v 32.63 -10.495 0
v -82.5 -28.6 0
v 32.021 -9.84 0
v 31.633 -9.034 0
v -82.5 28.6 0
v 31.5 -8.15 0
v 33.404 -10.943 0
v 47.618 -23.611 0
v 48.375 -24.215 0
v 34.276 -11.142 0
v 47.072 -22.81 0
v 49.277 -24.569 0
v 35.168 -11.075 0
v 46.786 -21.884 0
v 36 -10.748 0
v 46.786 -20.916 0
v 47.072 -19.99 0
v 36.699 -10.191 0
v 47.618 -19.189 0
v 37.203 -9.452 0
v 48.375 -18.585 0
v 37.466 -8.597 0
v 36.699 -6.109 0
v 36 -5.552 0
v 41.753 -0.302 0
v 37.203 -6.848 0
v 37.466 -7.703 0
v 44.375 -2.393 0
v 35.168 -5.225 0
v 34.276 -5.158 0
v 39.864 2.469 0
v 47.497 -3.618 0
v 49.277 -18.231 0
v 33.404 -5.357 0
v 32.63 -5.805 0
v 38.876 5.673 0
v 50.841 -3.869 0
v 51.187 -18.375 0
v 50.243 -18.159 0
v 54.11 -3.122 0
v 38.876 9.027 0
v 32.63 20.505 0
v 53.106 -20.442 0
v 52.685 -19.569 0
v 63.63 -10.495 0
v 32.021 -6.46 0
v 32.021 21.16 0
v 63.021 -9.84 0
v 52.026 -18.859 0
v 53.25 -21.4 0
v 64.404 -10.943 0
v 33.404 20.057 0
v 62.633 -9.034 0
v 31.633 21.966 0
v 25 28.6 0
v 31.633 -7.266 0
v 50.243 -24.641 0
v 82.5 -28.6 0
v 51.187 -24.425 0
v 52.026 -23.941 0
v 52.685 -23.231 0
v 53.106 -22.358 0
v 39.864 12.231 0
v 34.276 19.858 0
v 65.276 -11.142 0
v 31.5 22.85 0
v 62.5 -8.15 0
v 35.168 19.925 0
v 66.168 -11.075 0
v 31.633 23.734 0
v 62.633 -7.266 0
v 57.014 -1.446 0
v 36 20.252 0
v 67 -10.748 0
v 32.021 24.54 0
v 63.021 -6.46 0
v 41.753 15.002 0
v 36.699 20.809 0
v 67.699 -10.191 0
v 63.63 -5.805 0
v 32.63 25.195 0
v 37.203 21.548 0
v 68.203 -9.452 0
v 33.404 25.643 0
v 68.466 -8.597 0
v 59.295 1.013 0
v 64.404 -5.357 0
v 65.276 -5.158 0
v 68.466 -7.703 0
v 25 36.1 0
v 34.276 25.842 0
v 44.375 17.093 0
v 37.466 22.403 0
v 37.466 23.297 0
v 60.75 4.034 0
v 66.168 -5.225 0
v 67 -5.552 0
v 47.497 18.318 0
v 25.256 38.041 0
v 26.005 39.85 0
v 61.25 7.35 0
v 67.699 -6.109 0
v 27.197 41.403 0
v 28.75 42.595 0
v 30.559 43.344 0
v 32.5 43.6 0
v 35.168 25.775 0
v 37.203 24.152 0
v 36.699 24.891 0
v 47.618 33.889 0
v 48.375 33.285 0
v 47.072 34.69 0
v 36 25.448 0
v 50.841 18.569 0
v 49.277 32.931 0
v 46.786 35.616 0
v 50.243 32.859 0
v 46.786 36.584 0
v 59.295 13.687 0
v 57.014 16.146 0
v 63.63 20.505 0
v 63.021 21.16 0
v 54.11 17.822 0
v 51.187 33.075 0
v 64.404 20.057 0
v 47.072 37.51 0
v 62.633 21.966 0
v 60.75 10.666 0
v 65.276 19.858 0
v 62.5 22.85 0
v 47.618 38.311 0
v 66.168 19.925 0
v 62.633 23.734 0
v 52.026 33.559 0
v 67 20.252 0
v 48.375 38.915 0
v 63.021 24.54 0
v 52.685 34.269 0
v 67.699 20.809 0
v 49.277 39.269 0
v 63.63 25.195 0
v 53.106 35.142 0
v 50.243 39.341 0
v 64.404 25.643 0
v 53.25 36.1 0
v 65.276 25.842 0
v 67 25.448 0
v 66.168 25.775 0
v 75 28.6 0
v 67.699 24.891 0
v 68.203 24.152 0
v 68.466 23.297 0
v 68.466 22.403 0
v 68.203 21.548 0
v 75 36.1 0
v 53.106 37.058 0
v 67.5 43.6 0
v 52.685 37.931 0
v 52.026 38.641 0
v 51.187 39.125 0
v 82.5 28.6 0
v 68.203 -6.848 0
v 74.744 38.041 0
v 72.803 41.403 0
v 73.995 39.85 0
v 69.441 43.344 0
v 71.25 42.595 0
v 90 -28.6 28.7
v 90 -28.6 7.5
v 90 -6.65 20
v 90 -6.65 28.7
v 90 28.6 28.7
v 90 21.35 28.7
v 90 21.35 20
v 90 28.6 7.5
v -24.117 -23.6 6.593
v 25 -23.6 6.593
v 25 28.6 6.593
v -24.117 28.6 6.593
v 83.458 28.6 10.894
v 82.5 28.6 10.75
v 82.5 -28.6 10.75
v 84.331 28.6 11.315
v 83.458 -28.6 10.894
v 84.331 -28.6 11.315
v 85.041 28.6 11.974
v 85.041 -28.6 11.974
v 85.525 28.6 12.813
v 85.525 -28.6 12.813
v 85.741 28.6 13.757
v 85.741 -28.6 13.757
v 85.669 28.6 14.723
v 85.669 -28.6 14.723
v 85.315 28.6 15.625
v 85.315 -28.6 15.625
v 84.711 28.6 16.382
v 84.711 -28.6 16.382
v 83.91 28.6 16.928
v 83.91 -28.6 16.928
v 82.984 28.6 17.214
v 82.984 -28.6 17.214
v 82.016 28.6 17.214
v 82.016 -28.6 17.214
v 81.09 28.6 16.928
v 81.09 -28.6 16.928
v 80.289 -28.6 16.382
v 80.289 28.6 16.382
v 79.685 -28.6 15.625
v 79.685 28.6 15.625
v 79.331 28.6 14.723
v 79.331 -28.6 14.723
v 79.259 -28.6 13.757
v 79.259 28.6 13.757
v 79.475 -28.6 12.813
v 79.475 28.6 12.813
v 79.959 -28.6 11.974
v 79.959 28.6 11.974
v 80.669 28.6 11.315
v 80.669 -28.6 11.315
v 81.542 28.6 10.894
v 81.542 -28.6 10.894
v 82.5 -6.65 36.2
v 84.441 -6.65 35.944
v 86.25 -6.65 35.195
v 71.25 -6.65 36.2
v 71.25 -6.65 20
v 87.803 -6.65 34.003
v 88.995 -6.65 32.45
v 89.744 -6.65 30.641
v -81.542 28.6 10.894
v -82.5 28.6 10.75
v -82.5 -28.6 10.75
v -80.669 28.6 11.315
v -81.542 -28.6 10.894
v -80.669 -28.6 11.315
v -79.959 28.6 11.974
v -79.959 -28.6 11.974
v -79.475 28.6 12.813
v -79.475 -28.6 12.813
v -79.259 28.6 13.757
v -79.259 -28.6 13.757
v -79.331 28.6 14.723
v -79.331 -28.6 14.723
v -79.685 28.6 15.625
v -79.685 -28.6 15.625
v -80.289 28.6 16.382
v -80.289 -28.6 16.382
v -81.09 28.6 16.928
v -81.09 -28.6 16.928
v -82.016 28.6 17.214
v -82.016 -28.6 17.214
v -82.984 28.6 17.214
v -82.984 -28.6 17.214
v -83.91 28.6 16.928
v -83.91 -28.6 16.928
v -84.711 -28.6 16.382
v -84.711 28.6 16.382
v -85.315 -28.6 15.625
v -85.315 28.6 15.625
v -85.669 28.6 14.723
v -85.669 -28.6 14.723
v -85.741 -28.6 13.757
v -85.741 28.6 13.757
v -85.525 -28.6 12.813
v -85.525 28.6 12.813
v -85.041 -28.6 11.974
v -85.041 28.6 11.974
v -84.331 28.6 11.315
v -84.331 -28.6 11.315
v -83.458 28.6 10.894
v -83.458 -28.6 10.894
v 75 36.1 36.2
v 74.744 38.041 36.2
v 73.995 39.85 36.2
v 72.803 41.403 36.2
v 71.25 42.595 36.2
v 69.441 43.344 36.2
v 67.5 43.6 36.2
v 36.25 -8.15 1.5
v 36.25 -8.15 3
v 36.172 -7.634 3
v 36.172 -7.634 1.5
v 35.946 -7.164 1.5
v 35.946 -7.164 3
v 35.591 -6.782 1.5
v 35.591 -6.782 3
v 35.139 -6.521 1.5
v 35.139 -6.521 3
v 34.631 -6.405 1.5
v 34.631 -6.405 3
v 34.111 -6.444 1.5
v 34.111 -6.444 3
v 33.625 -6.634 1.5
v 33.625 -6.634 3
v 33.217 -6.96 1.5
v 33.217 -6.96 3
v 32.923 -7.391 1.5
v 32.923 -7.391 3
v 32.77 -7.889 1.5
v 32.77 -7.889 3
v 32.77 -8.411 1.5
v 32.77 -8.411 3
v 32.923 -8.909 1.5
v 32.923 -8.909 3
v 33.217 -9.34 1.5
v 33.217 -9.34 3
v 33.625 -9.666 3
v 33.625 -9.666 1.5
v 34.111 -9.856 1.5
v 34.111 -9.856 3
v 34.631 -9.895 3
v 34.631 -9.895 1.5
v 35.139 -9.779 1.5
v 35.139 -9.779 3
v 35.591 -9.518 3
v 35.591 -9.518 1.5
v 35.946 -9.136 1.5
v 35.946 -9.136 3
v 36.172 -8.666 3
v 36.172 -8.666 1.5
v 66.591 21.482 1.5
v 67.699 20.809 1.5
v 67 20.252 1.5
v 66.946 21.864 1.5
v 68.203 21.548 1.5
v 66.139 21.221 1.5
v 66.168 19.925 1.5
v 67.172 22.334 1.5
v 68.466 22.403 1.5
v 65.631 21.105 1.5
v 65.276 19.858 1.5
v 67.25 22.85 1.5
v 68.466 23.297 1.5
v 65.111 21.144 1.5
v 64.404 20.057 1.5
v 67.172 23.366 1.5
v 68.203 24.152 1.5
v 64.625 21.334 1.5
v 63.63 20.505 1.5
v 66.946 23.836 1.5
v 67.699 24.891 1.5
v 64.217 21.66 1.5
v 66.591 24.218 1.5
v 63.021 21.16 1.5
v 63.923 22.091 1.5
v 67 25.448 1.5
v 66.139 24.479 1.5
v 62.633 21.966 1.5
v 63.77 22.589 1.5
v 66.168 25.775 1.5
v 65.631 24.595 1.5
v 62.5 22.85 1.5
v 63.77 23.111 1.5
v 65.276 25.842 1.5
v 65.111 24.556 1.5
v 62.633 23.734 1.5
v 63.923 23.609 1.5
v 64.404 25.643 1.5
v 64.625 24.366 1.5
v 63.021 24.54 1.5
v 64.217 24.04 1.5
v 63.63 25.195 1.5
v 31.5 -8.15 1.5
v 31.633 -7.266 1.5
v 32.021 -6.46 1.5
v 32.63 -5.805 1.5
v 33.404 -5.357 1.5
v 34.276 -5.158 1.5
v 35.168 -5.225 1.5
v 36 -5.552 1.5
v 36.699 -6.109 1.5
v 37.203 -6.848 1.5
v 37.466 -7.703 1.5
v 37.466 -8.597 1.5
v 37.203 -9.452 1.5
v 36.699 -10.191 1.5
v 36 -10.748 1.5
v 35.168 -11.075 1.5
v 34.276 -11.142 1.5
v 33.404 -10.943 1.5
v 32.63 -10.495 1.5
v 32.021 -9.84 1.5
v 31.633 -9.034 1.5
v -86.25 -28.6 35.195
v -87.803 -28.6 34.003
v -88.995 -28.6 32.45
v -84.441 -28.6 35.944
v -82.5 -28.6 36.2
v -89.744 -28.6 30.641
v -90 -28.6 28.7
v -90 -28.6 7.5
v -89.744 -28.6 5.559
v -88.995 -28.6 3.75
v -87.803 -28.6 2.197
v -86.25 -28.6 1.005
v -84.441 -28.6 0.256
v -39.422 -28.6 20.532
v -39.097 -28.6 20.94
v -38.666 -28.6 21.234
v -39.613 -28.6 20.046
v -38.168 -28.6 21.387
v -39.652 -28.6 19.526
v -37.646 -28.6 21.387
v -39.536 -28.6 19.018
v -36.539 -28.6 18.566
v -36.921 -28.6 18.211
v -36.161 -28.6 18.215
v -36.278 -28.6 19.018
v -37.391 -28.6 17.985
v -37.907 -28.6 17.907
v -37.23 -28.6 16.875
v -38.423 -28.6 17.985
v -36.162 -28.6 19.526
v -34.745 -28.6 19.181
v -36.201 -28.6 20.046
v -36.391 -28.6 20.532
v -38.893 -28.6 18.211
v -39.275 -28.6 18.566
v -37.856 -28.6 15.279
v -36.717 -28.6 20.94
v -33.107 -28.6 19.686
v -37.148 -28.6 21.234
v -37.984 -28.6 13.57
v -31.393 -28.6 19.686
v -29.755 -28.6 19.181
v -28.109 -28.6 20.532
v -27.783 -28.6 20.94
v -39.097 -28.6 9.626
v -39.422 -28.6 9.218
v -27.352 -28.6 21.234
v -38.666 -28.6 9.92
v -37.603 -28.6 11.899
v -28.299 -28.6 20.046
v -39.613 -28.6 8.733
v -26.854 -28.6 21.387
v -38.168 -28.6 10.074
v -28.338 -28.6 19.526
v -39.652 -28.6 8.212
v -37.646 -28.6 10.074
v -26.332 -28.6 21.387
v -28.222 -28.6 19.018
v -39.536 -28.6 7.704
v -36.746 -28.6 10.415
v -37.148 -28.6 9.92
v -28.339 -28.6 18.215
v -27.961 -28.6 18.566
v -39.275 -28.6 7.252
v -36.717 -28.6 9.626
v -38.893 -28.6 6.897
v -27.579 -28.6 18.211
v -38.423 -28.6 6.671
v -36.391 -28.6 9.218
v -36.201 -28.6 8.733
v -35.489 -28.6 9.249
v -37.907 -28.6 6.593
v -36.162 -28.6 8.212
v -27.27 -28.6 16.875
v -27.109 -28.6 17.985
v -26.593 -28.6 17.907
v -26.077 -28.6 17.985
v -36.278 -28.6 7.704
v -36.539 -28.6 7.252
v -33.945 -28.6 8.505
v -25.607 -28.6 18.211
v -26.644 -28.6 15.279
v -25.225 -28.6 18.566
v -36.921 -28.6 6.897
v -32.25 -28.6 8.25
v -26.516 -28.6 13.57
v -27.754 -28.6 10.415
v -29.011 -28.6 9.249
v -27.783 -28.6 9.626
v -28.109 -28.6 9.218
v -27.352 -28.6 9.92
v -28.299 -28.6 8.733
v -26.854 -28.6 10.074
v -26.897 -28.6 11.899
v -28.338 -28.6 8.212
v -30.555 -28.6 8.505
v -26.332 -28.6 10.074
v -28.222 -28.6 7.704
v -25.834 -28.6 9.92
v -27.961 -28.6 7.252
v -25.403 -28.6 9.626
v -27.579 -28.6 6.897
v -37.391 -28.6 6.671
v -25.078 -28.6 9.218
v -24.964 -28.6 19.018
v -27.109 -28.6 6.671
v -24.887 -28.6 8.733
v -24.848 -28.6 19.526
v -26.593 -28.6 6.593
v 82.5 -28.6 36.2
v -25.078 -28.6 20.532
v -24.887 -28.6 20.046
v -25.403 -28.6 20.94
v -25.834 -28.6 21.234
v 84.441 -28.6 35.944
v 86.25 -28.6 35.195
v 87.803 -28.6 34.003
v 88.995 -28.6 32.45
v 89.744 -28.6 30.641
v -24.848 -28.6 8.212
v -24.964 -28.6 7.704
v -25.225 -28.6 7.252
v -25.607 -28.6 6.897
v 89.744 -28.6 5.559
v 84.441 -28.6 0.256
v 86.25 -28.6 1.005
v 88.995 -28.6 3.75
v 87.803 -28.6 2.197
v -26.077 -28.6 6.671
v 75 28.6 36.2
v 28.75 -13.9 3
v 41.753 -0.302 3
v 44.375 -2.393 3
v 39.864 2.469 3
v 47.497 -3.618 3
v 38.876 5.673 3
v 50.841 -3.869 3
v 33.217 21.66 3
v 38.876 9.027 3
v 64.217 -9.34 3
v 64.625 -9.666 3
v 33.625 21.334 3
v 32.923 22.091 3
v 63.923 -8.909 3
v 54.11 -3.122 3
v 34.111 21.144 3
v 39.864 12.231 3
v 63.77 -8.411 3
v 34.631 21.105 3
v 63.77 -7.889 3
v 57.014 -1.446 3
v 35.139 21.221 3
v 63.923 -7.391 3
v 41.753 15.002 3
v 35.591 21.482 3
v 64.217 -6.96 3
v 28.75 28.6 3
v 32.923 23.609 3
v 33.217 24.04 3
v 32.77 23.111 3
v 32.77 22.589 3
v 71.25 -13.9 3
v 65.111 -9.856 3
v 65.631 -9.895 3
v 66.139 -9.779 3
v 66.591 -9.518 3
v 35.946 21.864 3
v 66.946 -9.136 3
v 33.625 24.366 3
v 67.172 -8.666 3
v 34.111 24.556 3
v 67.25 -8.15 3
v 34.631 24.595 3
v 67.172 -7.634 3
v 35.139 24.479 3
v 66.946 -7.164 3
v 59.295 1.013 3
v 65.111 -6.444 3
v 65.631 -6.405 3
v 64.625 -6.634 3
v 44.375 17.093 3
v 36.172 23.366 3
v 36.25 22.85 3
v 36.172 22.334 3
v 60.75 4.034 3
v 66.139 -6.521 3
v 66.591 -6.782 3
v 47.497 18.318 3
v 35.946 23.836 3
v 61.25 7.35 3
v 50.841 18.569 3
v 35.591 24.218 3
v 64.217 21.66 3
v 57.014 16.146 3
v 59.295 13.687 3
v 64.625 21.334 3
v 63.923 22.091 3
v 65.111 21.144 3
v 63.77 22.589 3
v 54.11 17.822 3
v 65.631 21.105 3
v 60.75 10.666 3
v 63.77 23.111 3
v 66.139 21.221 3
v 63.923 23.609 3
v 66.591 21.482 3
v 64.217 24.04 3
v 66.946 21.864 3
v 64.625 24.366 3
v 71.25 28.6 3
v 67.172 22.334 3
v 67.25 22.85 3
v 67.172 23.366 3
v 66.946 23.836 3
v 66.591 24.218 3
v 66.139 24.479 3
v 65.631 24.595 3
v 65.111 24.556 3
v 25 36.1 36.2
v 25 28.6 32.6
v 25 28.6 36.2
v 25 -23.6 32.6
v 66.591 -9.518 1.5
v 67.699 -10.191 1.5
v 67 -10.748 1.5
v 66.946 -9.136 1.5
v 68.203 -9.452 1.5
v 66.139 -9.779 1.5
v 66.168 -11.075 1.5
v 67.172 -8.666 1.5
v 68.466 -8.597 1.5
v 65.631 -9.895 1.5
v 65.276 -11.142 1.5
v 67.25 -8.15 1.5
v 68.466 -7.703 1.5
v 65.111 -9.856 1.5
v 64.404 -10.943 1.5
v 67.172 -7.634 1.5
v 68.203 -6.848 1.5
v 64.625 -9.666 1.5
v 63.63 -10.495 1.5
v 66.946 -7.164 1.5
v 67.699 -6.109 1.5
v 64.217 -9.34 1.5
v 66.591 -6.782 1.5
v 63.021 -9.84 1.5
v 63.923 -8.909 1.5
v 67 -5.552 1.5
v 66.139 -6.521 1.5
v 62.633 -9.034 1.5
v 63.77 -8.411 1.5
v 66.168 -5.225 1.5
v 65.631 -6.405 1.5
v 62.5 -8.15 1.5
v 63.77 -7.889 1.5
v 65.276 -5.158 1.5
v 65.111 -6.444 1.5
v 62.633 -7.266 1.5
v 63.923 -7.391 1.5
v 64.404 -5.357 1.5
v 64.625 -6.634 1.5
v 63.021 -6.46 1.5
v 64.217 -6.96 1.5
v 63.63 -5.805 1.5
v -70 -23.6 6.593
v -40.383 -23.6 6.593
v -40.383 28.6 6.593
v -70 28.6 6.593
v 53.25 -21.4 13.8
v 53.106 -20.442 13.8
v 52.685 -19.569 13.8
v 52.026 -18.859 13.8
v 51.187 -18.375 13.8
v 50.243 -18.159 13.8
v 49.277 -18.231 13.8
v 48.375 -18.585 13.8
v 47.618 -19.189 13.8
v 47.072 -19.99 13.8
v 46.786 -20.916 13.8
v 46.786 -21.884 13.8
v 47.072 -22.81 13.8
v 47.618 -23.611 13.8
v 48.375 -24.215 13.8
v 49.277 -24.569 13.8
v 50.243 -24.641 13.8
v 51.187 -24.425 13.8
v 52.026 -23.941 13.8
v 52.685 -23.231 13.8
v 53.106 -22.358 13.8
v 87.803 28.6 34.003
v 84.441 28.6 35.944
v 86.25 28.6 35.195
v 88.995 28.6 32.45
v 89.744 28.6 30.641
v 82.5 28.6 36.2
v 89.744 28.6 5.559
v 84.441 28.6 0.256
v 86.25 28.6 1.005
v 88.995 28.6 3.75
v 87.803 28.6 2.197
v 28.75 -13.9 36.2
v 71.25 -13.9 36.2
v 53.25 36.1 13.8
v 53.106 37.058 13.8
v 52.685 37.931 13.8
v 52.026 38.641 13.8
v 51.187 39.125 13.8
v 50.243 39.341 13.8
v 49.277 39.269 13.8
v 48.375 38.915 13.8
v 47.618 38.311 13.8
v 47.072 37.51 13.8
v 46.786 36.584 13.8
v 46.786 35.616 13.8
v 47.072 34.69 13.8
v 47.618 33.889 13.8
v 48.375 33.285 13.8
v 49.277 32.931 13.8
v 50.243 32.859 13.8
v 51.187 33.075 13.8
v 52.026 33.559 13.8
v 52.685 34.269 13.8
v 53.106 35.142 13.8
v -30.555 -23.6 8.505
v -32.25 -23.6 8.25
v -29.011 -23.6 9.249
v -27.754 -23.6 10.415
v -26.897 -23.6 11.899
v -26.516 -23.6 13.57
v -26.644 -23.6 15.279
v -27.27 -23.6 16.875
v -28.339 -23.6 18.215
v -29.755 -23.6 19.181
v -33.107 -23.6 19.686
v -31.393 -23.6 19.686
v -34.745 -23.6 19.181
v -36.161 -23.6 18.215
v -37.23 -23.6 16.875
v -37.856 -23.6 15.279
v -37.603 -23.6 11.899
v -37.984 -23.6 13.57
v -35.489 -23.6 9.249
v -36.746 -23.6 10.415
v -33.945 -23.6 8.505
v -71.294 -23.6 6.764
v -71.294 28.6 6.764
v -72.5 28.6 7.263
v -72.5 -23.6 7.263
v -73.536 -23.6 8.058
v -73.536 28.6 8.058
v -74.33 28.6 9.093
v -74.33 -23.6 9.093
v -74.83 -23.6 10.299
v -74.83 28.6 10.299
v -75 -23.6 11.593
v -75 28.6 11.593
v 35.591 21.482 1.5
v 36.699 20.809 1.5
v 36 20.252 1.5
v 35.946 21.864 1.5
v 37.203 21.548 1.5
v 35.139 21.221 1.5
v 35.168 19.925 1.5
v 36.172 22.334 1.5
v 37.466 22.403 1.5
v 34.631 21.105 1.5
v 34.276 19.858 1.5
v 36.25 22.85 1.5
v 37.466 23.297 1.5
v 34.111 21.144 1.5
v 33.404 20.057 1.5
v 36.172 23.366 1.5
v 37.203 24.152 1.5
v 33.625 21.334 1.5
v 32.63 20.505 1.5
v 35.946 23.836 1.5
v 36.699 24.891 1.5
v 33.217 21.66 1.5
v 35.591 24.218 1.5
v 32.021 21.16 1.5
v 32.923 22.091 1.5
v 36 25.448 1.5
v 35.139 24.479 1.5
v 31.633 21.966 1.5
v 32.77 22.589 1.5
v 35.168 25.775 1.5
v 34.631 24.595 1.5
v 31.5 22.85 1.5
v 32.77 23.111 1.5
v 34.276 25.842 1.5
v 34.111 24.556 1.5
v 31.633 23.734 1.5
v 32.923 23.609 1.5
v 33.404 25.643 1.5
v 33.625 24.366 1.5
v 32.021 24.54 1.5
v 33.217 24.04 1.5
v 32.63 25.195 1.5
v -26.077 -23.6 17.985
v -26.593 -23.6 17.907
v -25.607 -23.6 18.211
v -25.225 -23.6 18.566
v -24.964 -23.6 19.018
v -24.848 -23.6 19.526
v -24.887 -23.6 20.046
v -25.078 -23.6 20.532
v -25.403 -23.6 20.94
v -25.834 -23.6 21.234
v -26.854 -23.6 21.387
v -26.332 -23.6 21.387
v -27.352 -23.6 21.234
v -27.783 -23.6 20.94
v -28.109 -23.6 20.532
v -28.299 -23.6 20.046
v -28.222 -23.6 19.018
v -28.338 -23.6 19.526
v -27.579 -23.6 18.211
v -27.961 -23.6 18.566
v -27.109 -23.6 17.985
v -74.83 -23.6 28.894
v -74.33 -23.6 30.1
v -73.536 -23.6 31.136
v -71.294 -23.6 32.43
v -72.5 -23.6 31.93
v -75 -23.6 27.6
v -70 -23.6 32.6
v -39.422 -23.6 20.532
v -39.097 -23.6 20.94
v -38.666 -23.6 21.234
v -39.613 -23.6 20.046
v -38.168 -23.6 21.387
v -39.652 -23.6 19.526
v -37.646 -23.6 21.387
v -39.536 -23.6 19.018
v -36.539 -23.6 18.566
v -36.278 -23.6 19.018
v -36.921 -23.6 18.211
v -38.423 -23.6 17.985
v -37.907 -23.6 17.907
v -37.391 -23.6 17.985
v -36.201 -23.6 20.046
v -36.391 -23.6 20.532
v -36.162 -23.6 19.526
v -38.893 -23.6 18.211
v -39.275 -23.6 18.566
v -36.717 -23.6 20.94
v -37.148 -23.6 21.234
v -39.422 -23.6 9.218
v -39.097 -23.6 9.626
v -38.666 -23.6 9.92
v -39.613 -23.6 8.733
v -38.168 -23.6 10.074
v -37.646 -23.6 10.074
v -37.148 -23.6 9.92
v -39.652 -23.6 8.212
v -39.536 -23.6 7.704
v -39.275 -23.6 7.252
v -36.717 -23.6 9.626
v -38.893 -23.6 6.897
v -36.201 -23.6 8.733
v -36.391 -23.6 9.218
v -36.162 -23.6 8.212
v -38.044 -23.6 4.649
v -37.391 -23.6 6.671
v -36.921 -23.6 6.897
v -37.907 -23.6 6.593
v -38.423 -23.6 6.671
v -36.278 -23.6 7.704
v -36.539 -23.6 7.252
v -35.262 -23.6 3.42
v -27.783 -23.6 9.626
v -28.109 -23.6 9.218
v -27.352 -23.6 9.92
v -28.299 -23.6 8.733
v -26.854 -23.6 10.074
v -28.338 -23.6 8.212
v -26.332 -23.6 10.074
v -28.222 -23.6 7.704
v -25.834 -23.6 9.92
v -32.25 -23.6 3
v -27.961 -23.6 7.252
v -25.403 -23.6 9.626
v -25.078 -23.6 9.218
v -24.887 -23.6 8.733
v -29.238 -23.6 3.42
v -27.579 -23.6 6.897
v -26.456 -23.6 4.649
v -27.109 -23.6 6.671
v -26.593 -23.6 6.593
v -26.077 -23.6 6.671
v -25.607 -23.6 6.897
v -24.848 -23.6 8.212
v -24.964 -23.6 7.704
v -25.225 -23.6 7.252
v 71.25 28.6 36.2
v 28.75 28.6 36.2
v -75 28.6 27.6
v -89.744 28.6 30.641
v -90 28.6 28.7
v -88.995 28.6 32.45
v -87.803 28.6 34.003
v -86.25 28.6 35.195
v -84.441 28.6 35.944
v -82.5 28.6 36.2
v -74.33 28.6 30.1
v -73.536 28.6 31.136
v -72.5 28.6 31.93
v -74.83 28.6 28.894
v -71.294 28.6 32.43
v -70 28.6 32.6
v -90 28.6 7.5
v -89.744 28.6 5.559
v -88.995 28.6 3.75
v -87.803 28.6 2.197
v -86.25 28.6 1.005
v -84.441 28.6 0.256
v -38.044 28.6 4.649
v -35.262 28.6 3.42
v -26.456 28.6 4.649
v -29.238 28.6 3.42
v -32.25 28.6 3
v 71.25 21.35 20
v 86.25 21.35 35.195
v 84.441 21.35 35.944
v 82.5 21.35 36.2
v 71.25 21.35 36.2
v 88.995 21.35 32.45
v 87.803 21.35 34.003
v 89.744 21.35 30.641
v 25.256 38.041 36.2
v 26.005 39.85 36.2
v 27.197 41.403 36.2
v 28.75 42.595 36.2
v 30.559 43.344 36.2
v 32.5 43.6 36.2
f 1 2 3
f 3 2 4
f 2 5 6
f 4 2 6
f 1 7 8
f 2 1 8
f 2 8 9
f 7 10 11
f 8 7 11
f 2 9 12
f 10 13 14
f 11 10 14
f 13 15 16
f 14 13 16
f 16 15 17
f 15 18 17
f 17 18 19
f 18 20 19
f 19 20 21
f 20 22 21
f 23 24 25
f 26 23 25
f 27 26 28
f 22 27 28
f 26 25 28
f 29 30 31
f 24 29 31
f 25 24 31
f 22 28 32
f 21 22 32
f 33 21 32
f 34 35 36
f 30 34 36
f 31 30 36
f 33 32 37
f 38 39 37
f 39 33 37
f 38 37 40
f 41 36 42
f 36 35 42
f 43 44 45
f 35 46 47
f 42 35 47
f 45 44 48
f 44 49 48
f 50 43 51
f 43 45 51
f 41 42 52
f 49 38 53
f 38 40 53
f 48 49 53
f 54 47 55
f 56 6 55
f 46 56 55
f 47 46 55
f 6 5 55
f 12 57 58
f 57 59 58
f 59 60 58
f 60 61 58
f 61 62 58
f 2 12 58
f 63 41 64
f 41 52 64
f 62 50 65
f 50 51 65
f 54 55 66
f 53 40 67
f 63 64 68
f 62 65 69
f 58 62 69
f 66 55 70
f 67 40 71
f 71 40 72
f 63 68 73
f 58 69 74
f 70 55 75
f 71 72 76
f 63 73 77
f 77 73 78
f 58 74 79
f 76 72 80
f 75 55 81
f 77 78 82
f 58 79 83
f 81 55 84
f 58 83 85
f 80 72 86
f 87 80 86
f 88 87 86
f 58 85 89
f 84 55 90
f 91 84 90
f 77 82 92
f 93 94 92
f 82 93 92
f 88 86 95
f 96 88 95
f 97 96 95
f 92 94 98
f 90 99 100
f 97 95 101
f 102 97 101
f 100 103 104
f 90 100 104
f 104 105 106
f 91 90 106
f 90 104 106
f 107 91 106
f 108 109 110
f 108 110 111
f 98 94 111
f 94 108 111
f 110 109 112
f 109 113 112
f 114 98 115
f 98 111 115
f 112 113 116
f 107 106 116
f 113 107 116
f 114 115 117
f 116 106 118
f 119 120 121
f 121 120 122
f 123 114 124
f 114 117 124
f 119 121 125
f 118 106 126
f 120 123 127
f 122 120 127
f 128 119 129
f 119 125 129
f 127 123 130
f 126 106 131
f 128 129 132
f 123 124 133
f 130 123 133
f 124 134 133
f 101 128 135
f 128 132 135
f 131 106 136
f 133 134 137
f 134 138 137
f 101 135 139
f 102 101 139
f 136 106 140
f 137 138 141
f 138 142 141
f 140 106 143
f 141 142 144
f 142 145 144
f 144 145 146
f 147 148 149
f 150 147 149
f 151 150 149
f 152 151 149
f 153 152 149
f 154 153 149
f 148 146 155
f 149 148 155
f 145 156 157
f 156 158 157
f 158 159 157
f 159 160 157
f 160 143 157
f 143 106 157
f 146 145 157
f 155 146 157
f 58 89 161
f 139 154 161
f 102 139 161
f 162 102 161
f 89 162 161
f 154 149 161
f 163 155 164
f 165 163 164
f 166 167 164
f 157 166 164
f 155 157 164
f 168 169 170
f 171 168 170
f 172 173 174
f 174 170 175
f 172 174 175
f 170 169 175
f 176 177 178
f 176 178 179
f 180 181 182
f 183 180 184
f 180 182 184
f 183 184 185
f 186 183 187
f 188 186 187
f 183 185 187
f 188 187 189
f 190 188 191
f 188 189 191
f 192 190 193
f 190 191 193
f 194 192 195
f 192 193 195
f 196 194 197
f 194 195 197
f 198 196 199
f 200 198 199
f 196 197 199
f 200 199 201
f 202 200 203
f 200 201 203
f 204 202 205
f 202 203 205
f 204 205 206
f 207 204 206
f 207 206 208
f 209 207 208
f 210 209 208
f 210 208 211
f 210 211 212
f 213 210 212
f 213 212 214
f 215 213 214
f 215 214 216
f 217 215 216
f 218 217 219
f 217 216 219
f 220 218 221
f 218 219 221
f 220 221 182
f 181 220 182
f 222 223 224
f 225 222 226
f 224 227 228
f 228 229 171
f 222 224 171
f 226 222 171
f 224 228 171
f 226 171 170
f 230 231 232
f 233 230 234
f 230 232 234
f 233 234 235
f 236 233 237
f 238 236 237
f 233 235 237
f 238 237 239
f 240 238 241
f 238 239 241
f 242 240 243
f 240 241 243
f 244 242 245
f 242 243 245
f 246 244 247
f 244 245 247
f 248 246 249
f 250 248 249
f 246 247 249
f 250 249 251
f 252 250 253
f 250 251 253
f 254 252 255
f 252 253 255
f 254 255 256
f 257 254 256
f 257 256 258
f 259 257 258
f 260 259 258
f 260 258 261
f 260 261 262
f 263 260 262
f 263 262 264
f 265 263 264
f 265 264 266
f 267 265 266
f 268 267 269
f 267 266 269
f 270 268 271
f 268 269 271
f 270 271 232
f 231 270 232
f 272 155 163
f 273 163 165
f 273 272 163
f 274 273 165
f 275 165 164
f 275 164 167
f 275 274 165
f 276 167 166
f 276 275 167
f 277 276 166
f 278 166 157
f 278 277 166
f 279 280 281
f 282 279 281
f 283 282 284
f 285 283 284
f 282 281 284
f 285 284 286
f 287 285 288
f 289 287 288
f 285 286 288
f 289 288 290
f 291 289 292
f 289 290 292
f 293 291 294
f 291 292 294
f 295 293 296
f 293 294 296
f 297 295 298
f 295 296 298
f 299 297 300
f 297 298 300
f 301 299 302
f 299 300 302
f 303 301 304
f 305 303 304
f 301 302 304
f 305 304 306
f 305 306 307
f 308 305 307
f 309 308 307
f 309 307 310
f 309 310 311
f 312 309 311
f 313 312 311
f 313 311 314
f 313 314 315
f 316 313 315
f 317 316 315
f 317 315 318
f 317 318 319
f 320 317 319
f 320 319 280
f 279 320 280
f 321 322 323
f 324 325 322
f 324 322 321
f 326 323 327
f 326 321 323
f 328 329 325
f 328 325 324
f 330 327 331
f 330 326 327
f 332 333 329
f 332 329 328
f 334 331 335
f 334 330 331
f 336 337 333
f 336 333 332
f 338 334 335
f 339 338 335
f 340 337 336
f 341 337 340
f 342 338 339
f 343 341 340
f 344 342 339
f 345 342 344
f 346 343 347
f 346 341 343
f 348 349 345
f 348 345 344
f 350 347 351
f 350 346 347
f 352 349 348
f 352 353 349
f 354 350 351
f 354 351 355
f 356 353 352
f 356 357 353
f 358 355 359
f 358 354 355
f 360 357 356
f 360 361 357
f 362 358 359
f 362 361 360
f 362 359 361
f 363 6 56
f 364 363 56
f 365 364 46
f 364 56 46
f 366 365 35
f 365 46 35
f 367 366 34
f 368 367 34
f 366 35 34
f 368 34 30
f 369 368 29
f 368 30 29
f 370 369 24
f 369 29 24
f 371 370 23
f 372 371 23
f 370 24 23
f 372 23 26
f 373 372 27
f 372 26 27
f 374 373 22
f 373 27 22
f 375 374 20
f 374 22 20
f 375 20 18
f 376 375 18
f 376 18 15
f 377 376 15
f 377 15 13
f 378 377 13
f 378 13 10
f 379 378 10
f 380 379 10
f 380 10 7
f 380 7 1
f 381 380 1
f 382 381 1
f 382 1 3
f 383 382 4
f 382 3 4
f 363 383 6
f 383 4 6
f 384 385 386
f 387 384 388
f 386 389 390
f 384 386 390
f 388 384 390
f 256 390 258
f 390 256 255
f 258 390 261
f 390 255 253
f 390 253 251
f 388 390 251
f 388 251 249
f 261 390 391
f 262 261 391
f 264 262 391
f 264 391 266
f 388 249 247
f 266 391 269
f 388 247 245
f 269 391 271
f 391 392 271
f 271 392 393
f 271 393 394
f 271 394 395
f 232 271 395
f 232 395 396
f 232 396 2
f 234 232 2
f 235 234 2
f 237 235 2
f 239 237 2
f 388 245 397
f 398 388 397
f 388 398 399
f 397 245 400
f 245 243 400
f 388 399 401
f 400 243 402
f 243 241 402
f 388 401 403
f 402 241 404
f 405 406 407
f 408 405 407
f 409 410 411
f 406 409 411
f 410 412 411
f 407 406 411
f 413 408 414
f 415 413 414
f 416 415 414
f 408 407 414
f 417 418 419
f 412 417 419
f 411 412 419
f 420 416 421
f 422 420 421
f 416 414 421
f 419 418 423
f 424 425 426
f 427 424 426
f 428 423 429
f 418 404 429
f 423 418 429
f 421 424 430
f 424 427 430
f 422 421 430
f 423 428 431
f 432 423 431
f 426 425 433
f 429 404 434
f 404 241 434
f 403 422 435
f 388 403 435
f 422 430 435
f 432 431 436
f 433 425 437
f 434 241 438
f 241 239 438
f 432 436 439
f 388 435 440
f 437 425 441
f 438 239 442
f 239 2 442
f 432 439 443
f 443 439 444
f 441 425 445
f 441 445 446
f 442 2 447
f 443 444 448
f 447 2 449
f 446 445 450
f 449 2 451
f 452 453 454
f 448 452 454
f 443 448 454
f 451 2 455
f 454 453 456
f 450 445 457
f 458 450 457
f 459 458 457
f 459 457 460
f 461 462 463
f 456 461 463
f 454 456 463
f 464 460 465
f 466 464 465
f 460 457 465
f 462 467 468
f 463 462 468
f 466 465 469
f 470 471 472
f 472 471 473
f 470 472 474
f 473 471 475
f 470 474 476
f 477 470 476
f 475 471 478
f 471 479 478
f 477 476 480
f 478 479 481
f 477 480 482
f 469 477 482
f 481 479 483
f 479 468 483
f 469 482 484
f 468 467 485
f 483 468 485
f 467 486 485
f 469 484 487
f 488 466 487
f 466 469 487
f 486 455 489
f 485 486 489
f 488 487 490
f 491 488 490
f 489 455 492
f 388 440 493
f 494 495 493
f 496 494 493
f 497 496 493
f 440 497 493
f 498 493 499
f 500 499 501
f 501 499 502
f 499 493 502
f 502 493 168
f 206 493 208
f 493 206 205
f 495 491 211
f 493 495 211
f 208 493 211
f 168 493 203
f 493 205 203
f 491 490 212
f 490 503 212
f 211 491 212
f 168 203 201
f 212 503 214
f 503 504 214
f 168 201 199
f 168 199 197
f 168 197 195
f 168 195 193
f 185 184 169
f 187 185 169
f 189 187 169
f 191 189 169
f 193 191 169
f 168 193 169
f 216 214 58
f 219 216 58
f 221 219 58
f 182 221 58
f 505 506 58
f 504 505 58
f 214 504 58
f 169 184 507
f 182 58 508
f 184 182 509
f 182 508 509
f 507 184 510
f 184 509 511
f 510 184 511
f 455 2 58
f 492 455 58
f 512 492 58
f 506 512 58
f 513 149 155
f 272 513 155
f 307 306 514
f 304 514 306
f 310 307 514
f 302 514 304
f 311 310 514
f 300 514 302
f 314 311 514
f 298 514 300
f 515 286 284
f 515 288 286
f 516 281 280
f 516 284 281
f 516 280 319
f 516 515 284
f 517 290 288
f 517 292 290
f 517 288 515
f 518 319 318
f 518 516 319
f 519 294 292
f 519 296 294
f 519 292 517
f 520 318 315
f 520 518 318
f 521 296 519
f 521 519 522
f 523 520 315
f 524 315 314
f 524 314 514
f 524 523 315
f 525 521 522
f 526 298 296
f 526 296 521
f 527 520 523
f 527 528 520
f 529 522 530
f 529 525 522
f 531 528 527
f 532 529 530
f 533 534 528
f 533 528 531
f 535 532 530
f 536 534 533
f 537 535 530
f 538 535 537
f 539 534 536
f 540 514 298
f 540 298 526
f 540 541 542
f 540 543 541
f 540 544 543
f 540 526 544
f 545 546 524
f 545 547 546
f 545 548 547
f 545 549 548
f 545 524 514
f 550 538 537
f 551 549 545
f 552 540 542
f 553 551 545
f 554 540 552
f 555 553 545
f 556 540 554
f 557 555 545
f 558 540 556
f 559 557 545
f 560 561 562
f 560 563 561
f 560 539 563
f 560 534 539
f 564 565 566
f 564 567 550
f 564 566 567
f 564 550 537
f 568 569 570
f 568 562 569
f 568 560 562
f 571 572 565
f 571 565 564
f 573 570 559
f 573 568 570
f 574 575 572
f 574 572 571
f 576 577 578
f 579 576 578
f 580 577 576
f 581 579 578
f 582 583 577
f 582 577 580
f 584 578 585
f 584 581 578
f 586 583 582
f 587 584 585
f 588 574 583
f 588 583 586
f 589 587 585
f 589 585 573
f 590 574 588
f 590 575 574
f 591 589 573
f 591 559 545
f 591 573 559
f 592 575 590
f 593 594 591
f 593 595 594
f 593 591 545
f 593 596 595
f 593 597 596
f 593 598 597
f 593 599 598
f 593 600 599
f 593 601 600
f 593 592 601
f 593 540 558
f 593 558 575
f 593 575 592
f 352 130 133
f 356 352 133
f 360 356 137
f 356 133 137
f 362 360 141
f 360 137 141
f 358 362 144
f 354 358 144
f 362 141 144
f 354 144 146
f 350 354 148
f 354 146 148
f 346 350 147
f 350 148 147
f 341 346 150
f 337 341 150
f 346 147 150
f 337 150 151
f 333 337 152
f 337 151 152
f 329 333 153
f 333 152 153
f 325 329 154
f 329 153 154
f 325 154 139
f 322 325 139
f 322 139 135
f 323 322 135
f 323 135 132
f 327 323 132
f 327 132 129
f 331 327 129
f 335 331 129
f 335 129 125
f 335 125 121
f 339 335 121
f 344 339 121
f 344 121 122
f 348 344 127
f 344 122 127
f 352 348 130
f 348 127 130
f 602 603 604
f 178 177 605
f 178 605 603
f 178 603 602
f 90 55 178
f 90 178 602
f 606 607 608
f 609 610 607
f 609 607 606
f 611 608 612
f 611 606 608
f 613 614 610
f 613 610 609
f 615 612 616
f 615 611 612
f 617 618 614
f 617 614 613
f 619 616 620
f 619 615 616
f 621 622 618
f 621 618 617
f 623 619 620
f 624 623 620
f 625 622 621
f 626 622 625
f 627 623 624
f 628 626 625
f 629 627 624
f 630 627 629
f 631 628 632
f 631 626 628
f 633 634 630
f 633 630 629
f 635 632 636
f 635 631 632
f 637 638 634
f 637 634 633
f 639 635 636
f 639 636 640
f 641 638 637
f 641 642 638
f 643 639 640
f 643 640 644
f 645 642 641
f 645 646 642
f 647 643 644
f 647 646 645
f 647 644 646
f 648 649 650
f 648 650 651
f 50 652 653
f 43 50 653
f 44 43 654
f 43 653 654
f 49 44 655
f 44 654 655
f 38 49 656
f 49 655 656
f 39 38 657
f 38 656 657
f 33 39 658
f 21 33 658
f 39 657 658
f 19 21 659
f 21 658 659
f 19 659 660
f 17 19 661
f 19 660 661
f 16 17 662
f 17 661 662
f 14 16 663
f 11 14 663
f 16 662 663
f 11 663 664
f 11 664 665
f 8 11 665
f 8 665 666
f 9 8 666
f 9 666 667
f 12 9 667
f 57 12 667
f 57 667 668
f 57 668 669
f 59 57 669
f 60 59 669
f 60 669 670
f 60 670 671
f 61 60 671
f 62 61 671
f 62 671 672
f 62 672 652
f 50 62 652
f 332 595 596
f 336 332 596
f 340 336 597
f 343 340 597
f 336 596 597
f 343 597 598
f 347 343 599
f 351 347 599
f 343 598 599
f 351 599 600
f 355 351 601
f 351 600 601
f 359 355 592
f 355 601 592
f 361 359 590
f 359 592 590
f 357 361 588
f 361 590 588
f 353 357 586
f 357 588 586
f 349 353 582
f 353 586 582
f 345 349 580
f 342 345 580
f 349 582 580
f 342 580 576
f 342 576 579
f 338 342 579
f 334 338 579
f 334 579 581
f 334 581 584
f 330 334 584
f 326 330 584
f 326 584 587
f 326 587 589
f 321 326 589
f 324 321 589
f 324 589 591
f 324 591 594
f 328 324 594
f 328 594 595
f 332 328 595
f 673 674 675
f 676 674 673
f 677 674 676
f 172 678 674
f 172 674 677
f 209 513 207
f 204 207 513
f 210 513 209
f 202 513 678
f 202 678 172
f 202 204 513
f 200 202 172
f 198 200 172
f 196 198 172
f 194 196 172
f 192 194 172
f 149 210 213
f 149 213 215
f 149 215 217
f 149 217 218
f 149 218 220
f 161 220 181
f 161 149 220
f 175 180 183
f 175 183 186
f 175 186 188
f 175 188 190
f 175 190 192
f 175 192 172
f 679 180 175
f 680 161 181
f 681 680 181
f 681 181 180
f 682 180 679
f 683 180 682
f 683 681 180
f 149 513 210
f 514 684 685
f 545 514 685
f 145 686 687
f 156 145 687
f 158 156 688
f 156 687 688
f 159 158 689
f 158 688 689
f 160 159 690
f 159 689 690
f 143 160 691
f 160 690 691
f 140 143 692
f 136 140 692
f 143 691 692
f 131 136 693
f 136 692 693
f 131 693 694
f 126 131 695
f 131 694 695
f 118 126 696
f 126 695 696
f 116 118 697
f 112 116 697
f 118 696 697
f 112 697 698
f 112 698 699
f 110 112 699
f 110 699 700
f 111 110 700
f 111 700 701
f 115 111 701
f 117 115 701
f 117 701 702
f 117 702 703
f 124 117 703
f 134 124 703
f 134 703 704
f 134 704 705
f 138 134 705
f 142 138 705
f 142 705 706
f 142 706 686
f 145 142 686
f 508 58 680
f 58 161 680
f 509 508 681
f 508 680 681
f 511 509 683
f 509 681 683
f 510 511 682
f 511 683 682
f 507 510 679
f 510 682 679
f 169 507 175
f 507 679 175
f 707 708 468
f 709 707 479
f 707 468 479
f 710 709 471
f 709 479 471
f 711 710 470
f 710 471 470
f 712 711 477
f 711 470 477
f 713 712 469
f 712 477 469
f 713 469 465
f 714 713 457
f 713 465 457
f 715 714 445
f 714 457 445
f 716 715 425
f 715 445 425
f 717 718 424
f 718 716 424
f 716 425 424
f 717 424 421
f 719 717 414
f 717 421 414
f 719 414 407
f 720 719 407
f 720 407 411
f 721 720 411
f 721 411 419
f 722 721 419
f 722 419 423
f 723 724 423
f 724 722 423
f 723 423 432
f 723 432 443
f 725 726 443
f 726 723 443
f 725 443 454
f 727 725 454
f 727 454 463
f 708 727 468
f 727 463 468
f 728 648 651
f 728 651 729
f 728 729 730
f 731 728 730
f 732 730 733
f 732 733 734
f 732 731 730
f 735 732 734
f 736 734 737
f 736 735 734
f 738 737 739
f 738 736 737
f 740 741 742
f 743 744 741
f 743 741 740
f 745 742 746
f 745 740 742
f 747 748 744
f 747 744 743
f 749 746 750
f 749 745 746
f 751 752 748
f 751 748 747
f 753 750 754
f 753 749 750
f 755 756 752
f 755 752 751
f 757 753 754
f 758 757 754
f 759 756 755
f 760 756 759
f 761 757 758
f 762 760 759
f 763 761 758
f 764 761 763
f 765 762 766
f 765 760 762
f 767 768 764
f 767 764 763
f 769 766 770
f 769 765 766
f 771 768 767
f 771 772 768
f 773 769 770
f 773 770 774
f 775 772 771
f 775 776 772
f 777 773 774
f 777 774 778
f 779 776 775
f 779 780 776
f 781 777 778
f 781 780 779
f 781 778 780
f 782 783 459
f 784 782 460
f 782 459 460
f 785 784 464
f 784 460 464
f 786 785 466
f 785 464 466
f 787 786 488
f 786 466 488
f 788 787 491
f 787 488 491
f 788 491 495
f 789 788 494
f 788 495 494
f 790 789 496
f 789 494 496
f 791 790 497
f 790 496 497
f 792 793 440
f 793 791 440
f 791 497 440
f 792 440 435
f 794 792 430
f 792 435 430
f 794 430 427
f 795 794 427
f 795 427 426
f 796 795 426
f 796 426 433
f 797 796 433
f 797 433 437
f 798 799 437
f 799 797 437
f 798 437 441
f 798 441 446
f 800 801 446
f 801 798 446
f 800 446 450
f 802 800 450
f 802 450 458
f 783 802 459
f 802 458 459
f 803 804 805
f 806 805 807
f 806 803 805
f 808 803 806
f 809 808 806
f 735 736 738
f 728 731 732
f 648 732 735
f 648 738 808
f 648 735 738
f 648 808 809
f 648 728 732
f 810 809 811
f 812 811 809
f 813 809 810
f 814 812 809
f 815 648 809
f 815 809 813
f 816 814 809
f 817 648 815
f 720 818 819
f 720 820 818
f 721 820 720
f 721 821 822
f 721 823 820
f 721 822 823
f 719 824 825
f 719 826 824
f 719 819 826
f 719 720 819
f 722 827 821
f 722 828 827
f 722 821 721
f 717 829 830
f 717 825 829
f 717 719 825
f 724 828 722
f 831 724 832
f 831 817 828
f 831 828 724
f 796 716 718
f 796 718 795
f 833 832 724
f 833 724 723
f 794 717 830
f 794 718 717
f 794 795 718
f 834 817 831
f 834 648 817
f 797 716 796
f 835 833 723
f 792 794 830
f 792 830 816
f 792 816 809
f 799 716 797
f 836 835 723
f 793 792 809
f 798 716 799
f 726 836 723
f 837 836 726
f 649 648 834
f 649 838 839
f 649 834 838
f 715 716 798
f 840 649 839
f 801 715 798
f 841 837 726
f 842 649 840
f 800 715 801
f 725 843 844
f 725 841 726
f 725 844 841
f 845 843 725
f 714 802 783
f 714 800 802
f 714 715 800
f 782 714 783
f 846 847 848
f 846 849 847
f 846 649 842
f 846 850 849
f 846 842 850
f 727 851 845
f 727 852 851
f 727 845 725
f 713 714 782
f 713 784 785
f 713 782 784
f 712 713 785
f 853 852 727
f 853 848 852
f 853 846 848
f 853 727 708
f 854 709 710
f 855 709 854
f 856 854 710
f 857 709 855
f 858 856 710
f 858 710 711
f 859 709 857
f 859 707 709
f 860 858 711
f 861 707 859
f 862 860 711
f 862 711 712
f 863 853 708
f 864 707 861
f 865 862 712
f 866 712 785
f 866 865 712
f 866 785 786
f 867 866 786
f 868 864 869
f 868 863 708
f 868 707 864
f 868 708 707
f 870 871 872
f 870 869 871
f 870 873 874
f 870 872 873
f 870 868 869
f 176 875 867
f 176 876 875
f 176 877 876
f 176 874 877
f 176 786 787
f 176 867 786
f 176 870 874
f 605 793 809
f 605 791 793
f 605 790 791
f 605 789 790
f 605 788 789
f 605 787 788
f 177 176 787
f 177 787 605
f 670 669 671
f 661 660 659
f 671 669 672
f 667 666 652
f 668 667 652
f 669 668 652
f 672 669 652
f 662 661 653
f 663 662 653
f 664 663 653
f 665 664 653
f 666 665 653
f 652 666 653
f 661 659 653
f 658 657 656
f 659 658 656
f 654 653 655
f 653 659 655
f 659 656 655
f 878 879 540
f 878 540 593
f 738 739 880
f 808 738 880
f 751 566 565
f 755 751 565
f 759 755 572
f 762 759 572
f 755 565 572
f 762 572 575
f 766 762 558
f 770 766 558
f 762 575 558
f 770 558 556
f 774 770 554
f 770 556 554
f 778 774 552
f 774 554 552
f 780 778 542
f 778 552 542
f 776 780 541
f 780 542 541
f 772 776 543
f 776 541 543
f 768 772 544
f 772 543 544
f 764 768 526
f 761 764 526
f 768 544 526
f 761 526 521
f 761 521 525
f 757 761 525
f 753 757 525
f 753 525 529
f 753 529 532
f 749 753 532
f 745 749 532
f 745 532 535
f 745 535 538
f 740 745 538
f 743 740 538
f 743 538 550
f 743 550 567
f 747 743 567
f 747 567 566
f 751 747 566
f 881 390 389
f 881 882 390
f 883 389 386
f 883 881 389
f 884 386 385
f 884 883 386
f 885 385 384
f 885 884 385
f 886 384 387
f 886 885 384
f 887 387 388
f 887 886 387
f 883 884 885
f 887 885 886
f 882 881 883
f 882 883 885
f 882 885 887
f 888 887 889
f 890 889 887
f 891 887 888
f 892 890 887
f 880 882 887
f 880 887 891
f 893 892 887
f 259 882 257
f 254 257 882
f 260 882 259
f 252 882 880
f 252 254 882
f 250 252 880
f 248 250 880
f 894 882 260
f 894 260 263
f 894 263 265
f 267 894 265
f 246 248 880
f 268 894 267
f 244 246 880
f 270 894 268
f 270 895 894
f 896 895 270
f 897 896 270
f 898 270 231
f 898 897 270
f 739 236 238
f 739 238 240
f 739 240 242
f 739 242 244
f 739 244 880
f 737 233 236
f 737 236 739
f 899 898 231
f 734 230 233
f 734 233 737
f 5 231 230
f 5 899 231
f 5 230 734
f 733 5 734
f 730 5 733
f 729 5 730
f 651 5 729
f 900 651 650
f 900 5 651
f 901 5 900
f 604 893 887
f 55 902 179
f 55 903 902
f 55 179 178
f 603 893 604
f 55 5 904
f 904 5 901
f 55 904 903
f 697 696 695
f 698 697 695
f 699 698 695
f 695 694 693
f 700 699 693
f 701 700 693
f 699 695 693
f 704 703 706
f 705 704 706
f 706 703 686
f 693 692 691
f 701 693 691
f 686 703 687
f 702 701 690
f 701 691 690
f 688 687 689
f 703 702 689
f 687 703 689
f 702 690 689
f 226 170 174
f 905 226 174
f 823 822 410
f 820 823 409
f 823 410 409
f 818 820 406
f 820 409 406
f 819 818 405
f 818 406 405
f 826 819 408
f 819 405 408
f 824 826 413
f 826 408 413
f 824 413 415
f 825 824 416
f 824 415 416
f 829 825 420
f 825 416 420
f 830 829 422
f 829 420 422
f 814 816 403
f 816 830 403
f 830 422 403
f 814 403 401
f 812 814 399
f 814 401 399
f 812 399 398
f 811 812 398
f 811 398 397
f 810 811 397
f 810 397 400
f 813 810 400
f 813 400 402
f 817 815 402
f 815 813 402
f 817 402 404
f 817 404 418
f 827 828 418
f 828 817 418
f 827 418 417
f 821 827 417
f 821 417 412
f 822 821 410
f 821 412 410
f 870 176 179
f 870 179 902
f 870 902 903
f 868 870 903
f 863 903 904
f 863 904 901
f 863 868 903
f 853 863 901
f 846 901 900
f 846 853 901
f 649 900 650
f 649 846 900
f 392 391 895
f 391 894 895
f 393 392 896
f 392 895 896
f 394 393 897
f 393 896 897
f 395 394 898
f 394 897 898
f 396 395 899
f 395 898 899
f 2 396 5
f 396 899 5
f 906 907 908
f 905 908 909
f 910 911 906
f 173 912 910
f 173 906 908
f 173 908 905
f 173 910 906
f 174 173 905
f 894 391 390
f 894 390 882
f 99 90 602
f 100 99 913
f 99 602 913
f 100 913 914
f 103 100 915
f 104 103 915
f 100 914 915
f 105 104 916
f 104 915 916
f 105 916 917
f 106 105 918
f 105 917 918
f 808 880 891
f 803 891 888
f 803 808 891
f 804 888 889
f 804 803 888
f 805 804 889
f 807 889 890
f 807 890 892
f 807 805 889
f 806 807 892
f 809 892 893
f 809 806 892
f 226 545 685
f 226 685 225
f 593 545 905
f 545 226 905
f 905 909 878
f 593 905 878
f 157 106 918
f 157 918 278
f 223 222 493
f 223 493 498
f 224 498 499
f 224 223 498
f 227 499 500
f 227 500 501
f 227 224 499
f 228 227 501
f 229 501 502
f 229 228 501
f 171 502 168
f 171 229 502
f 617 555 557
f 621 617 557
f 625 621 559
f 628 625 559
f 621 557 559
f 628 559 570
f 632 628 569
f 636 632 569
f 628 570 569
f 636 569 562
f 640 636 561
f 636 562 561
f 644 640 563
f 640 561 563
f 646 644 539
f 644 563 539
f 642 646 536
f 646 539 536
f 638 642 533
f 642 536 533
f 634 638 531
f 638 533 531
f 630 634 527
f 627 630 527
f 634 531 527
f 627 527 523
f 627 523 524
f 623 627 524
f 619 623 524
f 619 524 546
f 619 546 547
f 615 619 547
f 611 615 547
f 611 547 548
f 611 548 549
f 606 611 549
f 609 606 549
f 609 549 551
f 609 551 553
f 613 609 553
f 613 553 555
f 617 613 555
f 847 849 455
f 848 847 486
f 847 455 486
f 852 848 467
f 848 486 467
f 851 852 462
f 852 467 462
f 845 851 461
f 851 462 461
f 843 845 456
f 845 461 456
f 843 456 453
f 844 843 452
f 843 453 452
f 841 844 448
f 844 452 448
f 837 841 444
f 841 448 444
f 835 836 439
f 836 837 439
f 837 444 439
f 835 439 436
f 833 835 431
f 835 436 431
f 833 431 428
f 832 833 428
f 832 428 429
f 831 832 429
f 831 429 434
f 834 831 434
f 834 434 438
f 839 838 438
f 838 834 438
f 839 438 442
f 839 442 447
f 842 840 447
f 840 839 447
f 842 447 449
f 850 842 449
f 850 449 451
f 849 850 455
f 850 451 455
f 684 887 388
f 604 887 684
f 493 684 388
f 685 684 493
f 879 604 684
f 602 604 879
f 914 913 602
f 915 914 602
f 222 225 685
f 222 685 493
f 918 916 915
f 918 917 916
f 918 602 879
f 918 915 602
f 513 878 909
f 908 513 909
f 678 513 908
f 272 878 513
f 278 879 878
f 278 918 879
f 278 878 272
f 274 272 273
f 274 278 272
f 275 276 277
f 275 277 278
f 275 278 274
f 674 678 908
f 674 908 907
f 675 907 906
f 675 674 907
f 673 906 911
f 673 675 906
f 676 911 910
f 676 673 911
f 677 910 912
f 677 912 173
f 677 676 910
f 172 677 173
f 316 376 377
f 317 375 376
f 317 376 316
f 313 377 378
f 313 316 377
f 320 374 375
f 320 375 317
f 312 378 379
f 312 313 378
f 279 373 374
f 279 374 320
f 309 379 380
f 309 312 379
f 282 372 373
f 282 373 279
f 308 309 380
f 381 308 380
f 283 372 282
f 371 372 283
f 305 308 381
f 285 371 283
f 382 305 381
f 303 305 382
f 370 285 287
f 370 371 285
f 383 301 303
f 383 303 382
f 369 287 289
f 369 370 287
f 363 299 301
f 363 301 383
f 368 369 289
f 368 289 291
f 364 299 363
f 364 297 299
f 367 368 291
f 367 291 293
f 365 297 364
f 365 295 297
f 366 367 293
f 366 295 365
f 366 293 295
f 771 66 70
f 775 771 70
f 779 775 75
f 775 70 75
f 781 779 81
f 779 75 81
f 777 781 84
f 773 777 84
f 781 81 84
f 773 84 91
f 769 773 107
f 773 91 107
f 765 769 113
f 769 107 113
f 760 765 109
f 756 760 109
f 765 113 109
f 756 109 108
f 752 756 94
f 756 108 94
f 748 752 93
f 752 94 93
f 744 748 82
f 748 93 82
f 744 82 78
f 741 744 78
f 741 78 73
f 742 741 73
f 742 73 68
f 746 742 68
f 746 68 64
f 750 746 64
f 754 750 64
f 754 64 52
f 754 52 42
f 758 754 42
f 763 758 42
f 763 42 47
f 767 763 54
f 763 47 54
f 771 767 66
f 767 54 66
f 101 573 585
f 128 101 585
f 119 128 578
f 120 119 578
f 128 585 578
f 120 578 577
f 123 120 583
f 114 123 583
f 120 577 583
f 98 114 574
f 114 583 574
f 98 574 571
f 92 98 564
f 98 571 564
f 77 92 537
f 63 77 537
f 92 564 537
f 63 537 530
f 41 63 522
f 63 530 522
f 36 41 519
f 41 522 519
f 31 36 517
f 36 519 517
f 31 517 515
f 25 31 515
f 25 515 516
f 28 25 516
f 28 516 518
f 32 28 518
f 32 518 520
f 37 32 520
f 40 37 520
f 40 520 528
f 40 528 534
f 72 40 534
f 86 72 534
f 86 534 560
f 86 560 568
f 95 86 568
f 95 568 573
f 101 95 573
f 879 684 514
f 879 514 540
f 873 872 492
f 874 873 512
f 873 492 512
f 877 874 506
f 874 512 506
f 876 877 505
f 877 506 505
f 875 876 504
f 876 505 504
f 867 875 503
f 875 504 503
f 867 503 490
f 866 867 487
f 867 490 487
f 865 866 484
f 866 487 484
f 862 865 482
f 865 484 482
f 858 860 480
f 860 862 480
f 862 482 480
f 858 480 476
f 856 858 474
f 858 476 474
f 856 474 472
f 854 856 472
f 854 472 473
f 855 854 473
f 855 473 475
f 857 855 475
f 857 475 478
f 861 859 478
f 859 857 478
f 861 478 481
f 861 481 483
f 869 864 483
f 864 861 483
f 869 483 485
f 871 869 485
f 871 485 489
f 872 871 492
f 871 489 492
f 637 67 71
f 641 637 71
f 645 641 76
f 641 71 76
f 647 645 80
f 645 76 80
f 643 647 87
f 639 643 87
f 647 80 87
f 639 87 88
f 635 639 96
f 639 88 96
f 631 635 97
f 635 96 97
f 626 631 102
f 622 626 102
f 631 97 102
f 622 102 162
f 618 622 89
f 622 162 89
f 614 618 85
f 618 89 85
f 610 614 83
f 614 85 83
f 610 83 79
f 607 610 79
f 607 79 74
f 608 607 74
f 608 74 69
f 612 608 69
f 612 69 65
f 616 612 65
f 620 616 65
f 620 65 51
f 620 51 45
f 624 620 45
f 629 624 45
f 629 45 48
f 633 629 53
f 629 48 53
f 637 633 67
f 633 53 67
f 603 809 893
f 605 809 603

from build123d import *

# Parameters (mm, degrees)
SKETCH1_W           = 180
SKETCH1_H           = 57.2
SKETCH1_W_2         = 50
SKETCH1_H_2         = 15
BOSS_EXTRUDE1_DEPTH = 36.2
SKETCH2_R           = 3.25
SKETCH2_R_2         = 5.75
SKETCH2_R_3         = 1.75
CUT_EXTRUDE1_DEPTH  = 57.2
FILLET1_R           = 7.5
CUT_EXTRUDE3_START  = -52.2
SKETCH3_R           = 1.75
SKETCH3_R_2         = 5.75
CUT_EXTRUDE3_DEPTH  = 52.2
SKETCH4_W           = 42.5
SKETCH4_H           = 42.5
SKETCH4_R           = 11.25
SKETCH4_R_2         = 1.75
CUT_EXTRUDE4_DEPTH  = 33.2
SKETCH4_3_R         = 11.25
SKETCH4_3_R_2       = 1.75
CUT_EXTRUDE5_DEPTH  = 36.2
FILLET2_R           = 7.5
SKETCH8_R           = 3
CUT_EXTRUDE8_DEPTH  = 1.5
SKETCH7_R           = 3.25
CUT_EXTRUDE7_DEPTH  = 36.2
SKETCH7_2_R         = 3.25
BOSS_EXTRUDE3_DEPTH = 22.4
CUT_EXTRUDE9_REACH  = 190.71
SKETCH9_W           = 16.2
SKETCH9_H           = 28


with BuildPart() as part:
    # Sketch1 → Boss-Extrude1 (new body)
    with BuildSketch(Plane.XY):
        Rectangle(SKETCH1_W, SKETCH1_H)
        with Locations((50, 36.1)):
            Rectangle(SKETCH1_W_2, SKETCH1_H_2)
    extrude(amount=BOSS_EXTRUDE1_DEPTH)

    # Sketch2 → Cut-Extrude1 (cut)
    with BuildSketch(Plane.XZ.offset(28.6)):
        with Locations(Location((-82.5, 14, 0), (0, 0, 270))):
            Circle(SKETCH2_R)
        with Locations(Location((-32.25, 14, 0), (0, 0, 270))):
            Circle(SKETCH2_R_2)
        with Locations(Location((-37.906854249, 19.656854249, 0), (0, 0, 270))):
            Circle(SKETCH2_R_3)
        with Locations(Location((-26.593145751, 19.656854249, 0), (0, 0, 270))):
            Circle(SKETCH2_R_3)
        with Locations(Location((-37.906854249, 8.343145751, 0), (0, 0, 270))):
            Circle(SKETCH2_R_3)
        with Locations(Location((-26.593145751, 8.343145751, 0), (0, 0, 270))):
            Circle(SKETCH2_R_3)
        with Locations(Location((82.5, 14, 0), (0, 0, 270))):
            Circle(SKETCH2_R)
    extrude(amount=-CUT_EXTRUDE1_DEPTH, mode=Mode.SUBTRACT)

    # Fillet1
    fillet1_edges = [part.edges().sort_by_distance(p)[0] for p in [
        (-90, 0, 0),
        (90, 0, 0),
        (-90, 0, 36.2),
        (90, 0, 36.2),
    ]]
    fillet(fillet1_edges, radius=FILLET1_R)

    # Sketch3 → Cut-Extrude3 (cut)
    with BuildSketch(Plane(origin=(0, 28.6, 0), x_dir=(1, 0, 0), z_dir=(0, 1, 0)).offset(CUT_EXTRUDE3_START)):
        with BuildLine():
            Line((-40.382558646, -6.593145751), (-70, -6.593145751))
            ThreePointArc((-70, -6.593145751), (-73.535533906, -8.057611845), (-75, -11.593145751))
            Line((-75, -11.593145751), (-75, -27.6))
            ThreePointArc((-75, -27.6), (-73.535533906, -31.135533906), (-70, -32.6))
            Line((-70, -32.6), (25, -32.6))
            Line((25, -32.6), (25, -6.593145751))
            Line((25, -6.593145751), (-24.117441354, -6.593145751))
            ThreePointArc((-24.117441354, -6.593145751), (-32.25, -3), (-40.382558646, -6.593145751))
        make_face()
        with Locations(Location((-26.593145751, -8.343145751, 0), (0, 0, 90))):
            Circle(SKETCH3_R, mode=Mode.SUBTRACT)
        with Locations(Location((-37.906854249, -19.656854249, 0), (0, 0, 90))):
            Circle(SKETCH3_R, mode=Mode.SUBTRACT)
        with Locations(Location((-26.593145751, -19.656854249, 0), (0, 0, 90))):
            Circle(SKETCH3_R, mode=Mode.SUBTRACT)
        with Locations(Location((-37.906854249, -8.343145751, 0), (0, 0, 90))):
            Circle(SKETCH3_R, mode=Mode.SUBTRACT)
        with Locations(Location((-32.25, -14, 0), (0, 0, 90))):
            Circle(SKETCH3_R_2, mode=Mode.SUBTRACT)
    extrude(amount=CUT_EXTRUDE3_DEPTH, mode=Mode.SUBTRACT)

    # Sketch4 → Cut-Extrude4 (cut)
    with BuildSketch(Plane.XY.offset(36.2)):
        with Locations((50, 7.35)):
            Rectangle(SKETCH4_W, SKETCH4_H)
        with Locations((50, 7.35)):
            Circle(SKETCH4_R, mode=Mode.SUBTRACT)
        with Locations((34.5, 22.85)):
            Circle(SKETCH4_R_2, mode=Mode.SUBTRACT)
        with Locations((65.5, 22.85)):
            Circle(SKETCH4_R_2, mode=Mode.SUBTRACT)
        with Locations((65.5, -8.15)):
            Circle(SKETCH4_R_2, mode=Mode.SUBTRACT)
        with Locations((34.5, -8.15)):
            Circle(SKETCH4_R_2, mode=Mode.SUBTRACT)
    extrude(amount=-CUT_EXTRUDE4_DEPTH, mode=Mode.SUBTRACT)

    # Sketch4<3> → Cut-Extrude5 (cut)
    with BuildSketch(Plane.XY.offset(36.2)):
        with Locations((50, 7.35)):
            Circle(SKETCH4_3_R)
        with Locations((34.5, 22.85)):
            Circle(SKETCH4_3_R_2)
        with Locations((65.5, 22.85)):
            Circle(SKETCH4_3_R_2)
        with Locations((65.5, -8.15)):
            Circle(SKETCH4_3_R_2)
        with Locations((34.5, -8.15)):
            Circle(SKETCH4_3_R_2)
    extrude(amount=-CUT_EXTRUDE5_DEPTH, mode=Mode.SUBTRACT)

    # Fillet2
    fillet2_edges = [part.edges().sort_by_distance(p)[0] for p in [
        (25, 43.6, 18.1),
        (75, 43.6, 18.1),
    ]]
    fillet(fillet2_edges, radius=FILLET2_R)

    # Sketch8 → Cut-Extrude8 (cut)
    with BuildSketch(Plane(origin=(0, 0, 0), x_dir=(-1, 0, 0), z_dir=(0, 0, -1))):
        with Locations((-65.5, 22.85)):
            Circle(SKETCH8_R)
        with Locations((-34.5, 22.85)):
            Circle(SKETCH8_R)
        with Locations((-34.5, -8.15)):
            Circle(SKETCH8_R)
        with Locations((-65.5, -8.15)):
            Circle(SKETCH8_R)
    extrude(amount=-CUT_EXTRUDE8_DEPTH, mode=Mode.SUBTRACT)

    # Sketch7 → Cut-Extrude7 (cut)
    with BuildSketch(Plane.XY.offset(36.2)):
        with Locations((50, -21.4)):
            Circle(SKETCH7_R)
        with Locations((50, 36.1)):
            Circle(SKETCH7_R)
    extrude(amount=-CUT_EXTRUDE7_DEPTH, mode=Mode.SUBTRACT)

    # Sketch7<2> → Boss-Extrude3 (add)
    with BuildSketch(Plane.XY.offset(36.2)):
        with Locations((50, -21.4)):
            Circle(SKETCH7_2_R)
        with Locations((50, 36.1)):
            Circle(SKETCH7_2_R)
    extrude(amount=-BOSS_EXTRUDE3_DEPTH)

    # Cut-Extrude9: up to this face of the body (flat: up to its plane)
    cut_extrude9_end = Plane(part.part.faces().sort_by_distance((71.25, 7.35, 19.6))[0])
    # Sketch9 → Cut-Extrude9 (cut, up to the picked face)
    with BuildSketch(Plane(origin=(90, 0, 0), x_dir=(0, 0, -1), z_dir=(1, 0, 0)), mode=Mode.PRIVATE) as cut_extrude9_sk1:
        with Locations((-28.1, 7.35)):
            Rectangle(SKETCH9_W, SKETCH9_H)
    cut_extrude9_tool1 = split(extrude(cut_extrude9_sk1.sketch, amount=-CUT_EXTRUDE9_REACH, mode=Mode.PRIVATE), bisect_by=cut_extrude9_end, keep=Keep.BOTH, mode=Mode.PRIVATE)
    add(cut_extrude9_tool1.solids().sort_by(Axis((90, 7.35, 28.1), (-1, 0, 0)))[0], mode=Mode.SUBTRACT)


solid = part.part
